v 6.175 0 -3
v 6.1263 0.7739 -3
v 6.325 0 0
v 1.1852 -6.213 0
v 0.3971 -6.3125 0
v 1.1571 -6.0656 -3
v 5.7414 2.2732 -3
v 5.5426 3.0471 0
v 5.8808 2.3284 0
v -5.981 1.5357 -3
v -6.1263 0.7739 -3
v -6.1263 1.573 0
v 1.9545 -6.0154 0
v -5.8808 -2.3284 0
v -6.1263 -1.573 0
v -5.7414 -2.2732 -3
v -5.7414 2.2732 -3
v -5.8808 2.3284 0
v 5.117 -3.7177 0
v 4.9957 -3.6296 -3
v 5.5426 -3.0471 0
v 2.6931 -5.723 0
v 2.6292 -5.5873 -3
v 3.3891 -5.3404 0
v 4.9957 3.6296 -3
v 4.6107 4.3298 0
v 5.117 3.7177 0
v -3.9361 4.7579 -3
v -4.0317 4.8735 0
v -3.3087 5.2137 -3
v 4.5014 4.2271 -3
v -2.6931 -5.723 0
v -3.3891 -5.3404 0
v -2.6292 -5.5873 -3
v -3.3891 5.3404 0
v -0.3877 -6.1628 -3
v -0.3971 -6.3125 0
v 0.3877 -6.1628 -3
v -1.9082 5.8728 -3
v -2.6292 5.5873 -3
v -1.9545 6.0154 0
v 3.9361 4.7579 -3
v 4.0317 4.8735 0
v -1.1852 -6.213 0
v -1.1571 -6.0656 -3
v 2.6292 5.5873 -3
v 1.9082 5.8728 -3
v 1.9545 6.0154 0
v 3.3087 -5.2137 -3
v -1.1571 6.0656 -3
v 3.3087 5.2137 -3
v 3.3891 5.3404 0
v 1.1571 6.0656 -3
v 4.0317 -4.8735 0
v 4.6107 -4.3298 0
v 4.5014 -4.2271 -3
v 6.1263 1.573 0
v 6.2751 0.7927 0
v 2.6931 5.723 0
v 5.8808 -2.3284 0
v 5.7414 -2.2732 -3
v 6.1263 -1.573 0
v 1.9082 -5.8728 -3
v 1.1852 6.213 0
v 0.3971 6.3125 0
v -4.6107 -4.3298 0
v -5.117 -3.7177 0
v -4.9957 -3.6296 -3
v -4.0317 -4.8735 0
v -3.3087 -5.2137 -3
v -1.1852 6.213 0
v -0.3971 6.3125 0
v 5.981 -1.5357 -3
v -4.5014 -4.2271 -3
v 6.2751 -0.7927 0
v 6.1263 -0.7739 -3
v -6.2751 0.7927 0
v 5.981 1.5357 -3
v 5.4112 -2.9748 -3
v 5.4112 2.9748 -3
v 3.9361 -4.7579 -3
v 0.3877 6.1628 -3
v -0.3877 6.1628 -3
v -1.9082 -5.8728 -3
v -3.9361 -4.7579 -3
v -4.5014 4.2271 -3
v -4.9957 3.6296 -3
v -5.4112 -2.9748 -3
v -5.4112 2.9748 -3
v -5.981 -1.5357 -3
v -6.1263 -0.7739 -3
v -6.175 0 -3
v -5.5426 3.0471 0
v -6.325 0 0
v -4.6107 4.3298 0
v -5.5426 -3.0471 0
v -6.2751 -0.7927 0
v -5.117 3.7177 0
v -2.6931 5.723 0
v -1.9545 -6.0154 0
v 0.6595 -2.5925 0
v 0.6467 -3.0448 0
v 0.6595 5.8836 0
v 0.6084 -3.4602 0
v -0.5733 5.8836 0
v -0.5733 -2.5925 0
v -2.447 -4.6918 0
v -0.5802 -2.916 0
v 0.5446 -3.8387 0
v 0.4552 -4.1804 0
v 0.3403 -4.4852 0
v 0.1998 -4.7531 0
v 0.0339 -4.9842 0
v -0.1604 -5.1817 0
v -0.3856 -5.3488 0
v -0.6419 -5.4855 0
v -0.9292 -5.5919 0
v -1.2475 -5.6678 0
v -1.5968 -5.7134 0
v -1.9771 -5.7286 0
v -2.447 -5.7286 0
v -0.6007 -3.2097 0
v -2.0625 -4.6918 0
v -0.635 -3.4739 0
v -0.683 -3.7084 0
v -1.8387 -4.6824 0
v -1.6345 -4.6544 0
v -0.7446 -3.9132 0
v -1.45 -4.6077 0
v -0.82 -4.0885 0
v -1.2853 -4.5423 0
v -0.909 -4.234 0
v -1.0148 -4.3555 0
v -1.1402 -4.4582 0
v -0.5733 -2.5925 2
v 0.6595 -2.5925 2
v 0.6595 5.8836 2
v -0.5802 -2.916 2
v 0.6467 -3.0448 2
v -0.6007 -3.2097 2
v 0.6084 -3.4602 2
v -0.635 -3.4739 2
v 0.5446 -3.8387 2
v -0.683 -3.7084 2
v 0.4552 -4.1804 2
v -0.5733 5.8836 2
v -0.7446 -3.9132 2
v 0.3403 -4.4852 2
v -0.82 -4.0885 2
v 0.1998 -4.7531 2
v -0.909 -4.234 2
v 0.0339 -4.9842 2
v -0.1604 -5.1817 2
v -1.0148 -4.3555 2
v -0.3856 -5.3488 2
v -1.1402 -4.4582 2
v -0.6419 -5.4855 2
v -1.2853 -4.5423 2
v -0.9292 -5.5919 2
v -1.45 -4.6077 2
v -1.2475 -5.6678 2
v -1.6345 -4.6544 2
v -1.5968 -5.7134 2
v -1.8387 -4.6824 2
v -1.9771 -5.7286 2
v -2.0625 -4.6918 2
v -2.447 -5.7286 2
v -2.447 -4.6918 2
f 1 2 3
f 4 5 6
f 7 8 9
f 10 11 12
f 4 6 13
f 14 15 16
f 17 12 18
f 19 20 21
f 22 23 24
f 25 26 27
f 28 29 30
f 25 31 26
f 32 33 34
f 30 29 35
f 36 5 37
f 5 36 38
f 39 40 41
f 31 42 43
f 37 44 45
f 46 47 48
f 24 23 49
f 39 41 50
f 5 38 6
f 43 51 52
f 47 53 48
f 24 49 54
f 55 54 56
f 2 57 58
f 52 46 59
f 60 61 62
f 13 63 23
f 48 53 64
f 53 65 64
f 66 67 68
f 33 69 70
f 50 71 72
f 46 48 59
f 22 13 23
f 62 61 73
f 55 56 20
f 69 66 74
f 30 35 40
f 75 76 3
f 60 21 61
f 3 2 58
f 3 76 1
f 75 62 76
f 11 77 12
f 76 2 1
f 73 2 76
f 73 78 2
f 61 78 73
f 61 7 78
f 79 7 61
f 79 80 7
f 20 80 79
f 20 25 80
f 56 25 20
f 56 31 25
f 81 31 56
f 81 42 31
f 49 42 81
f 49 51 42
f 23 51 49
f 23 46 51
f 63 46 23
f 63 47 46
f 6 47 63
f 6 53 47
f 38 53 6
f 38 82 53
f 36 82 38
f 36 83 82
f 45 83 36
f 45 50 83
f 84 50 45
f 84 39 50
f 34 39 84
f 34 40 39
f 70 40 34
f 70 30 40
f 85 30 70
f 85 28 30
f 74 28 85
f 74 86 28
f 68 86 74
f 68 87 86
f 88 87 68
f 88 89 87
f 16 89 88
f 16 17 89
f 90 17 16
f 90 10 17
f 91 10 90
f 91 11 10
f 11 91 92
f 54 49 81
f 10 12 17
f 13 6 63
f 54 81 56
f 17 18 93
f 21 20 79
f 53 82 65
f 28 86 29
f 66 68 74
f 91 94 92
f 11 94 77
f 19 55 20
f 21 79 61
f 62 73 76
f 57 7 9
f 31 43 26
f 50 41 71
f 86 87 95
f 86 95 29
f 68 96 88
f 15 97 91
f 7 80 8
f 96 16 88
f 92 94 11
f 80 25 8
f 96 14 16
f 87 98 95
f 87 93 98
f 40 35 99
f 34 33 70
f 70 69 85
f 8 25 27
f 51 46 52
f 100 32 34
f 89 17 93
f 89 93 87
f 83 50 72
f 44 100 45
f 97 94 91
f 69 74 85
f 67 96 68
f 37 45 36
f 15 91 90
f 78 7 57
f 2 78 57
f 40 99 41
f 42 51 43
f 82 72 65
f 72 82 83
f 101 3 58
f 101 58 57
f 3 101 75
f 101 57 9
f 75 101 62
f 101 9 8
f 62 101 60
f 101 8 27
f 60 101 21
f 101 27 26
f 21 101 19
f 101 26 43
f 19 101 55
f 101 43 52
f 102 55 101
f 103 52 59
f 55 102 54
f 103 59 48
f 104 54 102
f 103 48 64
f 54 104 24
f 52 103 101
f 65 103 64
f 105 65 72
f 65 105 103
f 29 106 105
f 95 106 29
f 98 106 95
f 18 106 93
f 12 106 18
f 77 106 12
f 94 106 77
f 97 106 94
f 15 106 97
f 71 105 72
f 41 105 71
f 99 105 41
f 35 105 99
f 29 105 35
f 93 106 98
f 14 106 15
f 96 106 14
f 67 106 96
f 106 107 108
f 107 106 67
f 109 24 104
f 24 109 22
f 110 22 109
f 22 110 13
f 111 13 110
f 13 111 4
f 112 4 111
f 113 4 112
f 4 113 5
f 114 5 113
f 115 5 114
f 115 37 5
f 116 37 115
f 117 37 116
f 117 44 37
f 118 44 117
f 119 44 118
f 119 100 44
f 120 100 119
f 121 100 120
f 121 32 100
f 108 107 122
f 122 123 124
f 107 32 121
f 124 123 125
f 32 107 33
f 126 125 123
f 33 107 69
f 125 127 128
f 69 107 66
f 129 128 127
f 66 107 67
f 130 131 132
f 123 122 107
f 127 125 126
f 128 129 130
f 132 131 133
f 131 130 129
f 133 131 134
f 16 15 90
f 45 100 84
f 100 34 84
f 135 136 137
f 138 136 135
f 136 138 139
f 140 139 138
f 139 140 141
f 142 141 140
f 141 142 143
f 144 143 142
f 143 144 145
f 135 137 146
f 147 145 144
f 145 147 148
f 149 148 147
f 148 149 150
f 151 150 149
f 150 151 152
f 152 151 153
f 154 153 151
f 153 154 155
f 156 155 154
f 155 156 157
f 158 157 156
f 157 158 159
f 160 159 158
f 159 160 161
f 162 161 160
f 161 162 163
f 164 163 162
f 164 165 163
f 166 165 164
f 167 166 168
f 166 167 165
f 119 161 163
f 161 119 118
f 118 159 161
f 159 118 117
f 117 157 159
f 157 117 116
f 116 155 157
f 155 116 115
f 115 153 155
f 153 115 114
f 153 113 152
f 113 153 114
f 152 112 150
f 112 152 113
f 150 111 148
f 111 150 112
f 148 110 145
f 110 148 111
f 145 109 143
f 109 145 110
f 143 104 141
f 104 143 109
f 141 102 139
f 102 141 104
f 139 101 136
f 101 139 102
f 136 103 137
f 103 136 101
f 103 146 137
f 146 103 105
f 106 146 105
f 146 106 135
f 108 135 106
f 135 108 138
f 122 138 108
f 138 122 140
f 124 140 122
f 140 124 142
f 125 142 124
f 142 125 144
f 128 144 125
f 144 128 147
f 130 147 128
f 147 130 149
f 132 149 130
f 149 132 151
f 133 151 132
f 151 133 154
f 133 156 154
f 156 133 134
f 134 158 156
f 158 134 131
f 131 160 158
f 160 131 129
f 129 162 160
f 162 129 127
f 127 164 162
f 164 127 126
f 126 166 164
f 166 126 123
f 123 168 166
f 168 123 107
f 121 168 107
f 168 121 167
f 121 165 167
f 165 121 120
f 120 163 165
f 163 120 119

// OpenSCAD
$fn = 50;


difference() {
	union() {
		translate(v = [0, 0, -3.0000000000]) {
			cylinder(h = 3, r1 = 6.1750000000, r2 = 6.3250000000);
		}
		linear_extrude(height = 2) {
			text(font = "Wingdings", halign = "center", size = 9, text = "J", valign = "center");
		}
	}
	union();
}
